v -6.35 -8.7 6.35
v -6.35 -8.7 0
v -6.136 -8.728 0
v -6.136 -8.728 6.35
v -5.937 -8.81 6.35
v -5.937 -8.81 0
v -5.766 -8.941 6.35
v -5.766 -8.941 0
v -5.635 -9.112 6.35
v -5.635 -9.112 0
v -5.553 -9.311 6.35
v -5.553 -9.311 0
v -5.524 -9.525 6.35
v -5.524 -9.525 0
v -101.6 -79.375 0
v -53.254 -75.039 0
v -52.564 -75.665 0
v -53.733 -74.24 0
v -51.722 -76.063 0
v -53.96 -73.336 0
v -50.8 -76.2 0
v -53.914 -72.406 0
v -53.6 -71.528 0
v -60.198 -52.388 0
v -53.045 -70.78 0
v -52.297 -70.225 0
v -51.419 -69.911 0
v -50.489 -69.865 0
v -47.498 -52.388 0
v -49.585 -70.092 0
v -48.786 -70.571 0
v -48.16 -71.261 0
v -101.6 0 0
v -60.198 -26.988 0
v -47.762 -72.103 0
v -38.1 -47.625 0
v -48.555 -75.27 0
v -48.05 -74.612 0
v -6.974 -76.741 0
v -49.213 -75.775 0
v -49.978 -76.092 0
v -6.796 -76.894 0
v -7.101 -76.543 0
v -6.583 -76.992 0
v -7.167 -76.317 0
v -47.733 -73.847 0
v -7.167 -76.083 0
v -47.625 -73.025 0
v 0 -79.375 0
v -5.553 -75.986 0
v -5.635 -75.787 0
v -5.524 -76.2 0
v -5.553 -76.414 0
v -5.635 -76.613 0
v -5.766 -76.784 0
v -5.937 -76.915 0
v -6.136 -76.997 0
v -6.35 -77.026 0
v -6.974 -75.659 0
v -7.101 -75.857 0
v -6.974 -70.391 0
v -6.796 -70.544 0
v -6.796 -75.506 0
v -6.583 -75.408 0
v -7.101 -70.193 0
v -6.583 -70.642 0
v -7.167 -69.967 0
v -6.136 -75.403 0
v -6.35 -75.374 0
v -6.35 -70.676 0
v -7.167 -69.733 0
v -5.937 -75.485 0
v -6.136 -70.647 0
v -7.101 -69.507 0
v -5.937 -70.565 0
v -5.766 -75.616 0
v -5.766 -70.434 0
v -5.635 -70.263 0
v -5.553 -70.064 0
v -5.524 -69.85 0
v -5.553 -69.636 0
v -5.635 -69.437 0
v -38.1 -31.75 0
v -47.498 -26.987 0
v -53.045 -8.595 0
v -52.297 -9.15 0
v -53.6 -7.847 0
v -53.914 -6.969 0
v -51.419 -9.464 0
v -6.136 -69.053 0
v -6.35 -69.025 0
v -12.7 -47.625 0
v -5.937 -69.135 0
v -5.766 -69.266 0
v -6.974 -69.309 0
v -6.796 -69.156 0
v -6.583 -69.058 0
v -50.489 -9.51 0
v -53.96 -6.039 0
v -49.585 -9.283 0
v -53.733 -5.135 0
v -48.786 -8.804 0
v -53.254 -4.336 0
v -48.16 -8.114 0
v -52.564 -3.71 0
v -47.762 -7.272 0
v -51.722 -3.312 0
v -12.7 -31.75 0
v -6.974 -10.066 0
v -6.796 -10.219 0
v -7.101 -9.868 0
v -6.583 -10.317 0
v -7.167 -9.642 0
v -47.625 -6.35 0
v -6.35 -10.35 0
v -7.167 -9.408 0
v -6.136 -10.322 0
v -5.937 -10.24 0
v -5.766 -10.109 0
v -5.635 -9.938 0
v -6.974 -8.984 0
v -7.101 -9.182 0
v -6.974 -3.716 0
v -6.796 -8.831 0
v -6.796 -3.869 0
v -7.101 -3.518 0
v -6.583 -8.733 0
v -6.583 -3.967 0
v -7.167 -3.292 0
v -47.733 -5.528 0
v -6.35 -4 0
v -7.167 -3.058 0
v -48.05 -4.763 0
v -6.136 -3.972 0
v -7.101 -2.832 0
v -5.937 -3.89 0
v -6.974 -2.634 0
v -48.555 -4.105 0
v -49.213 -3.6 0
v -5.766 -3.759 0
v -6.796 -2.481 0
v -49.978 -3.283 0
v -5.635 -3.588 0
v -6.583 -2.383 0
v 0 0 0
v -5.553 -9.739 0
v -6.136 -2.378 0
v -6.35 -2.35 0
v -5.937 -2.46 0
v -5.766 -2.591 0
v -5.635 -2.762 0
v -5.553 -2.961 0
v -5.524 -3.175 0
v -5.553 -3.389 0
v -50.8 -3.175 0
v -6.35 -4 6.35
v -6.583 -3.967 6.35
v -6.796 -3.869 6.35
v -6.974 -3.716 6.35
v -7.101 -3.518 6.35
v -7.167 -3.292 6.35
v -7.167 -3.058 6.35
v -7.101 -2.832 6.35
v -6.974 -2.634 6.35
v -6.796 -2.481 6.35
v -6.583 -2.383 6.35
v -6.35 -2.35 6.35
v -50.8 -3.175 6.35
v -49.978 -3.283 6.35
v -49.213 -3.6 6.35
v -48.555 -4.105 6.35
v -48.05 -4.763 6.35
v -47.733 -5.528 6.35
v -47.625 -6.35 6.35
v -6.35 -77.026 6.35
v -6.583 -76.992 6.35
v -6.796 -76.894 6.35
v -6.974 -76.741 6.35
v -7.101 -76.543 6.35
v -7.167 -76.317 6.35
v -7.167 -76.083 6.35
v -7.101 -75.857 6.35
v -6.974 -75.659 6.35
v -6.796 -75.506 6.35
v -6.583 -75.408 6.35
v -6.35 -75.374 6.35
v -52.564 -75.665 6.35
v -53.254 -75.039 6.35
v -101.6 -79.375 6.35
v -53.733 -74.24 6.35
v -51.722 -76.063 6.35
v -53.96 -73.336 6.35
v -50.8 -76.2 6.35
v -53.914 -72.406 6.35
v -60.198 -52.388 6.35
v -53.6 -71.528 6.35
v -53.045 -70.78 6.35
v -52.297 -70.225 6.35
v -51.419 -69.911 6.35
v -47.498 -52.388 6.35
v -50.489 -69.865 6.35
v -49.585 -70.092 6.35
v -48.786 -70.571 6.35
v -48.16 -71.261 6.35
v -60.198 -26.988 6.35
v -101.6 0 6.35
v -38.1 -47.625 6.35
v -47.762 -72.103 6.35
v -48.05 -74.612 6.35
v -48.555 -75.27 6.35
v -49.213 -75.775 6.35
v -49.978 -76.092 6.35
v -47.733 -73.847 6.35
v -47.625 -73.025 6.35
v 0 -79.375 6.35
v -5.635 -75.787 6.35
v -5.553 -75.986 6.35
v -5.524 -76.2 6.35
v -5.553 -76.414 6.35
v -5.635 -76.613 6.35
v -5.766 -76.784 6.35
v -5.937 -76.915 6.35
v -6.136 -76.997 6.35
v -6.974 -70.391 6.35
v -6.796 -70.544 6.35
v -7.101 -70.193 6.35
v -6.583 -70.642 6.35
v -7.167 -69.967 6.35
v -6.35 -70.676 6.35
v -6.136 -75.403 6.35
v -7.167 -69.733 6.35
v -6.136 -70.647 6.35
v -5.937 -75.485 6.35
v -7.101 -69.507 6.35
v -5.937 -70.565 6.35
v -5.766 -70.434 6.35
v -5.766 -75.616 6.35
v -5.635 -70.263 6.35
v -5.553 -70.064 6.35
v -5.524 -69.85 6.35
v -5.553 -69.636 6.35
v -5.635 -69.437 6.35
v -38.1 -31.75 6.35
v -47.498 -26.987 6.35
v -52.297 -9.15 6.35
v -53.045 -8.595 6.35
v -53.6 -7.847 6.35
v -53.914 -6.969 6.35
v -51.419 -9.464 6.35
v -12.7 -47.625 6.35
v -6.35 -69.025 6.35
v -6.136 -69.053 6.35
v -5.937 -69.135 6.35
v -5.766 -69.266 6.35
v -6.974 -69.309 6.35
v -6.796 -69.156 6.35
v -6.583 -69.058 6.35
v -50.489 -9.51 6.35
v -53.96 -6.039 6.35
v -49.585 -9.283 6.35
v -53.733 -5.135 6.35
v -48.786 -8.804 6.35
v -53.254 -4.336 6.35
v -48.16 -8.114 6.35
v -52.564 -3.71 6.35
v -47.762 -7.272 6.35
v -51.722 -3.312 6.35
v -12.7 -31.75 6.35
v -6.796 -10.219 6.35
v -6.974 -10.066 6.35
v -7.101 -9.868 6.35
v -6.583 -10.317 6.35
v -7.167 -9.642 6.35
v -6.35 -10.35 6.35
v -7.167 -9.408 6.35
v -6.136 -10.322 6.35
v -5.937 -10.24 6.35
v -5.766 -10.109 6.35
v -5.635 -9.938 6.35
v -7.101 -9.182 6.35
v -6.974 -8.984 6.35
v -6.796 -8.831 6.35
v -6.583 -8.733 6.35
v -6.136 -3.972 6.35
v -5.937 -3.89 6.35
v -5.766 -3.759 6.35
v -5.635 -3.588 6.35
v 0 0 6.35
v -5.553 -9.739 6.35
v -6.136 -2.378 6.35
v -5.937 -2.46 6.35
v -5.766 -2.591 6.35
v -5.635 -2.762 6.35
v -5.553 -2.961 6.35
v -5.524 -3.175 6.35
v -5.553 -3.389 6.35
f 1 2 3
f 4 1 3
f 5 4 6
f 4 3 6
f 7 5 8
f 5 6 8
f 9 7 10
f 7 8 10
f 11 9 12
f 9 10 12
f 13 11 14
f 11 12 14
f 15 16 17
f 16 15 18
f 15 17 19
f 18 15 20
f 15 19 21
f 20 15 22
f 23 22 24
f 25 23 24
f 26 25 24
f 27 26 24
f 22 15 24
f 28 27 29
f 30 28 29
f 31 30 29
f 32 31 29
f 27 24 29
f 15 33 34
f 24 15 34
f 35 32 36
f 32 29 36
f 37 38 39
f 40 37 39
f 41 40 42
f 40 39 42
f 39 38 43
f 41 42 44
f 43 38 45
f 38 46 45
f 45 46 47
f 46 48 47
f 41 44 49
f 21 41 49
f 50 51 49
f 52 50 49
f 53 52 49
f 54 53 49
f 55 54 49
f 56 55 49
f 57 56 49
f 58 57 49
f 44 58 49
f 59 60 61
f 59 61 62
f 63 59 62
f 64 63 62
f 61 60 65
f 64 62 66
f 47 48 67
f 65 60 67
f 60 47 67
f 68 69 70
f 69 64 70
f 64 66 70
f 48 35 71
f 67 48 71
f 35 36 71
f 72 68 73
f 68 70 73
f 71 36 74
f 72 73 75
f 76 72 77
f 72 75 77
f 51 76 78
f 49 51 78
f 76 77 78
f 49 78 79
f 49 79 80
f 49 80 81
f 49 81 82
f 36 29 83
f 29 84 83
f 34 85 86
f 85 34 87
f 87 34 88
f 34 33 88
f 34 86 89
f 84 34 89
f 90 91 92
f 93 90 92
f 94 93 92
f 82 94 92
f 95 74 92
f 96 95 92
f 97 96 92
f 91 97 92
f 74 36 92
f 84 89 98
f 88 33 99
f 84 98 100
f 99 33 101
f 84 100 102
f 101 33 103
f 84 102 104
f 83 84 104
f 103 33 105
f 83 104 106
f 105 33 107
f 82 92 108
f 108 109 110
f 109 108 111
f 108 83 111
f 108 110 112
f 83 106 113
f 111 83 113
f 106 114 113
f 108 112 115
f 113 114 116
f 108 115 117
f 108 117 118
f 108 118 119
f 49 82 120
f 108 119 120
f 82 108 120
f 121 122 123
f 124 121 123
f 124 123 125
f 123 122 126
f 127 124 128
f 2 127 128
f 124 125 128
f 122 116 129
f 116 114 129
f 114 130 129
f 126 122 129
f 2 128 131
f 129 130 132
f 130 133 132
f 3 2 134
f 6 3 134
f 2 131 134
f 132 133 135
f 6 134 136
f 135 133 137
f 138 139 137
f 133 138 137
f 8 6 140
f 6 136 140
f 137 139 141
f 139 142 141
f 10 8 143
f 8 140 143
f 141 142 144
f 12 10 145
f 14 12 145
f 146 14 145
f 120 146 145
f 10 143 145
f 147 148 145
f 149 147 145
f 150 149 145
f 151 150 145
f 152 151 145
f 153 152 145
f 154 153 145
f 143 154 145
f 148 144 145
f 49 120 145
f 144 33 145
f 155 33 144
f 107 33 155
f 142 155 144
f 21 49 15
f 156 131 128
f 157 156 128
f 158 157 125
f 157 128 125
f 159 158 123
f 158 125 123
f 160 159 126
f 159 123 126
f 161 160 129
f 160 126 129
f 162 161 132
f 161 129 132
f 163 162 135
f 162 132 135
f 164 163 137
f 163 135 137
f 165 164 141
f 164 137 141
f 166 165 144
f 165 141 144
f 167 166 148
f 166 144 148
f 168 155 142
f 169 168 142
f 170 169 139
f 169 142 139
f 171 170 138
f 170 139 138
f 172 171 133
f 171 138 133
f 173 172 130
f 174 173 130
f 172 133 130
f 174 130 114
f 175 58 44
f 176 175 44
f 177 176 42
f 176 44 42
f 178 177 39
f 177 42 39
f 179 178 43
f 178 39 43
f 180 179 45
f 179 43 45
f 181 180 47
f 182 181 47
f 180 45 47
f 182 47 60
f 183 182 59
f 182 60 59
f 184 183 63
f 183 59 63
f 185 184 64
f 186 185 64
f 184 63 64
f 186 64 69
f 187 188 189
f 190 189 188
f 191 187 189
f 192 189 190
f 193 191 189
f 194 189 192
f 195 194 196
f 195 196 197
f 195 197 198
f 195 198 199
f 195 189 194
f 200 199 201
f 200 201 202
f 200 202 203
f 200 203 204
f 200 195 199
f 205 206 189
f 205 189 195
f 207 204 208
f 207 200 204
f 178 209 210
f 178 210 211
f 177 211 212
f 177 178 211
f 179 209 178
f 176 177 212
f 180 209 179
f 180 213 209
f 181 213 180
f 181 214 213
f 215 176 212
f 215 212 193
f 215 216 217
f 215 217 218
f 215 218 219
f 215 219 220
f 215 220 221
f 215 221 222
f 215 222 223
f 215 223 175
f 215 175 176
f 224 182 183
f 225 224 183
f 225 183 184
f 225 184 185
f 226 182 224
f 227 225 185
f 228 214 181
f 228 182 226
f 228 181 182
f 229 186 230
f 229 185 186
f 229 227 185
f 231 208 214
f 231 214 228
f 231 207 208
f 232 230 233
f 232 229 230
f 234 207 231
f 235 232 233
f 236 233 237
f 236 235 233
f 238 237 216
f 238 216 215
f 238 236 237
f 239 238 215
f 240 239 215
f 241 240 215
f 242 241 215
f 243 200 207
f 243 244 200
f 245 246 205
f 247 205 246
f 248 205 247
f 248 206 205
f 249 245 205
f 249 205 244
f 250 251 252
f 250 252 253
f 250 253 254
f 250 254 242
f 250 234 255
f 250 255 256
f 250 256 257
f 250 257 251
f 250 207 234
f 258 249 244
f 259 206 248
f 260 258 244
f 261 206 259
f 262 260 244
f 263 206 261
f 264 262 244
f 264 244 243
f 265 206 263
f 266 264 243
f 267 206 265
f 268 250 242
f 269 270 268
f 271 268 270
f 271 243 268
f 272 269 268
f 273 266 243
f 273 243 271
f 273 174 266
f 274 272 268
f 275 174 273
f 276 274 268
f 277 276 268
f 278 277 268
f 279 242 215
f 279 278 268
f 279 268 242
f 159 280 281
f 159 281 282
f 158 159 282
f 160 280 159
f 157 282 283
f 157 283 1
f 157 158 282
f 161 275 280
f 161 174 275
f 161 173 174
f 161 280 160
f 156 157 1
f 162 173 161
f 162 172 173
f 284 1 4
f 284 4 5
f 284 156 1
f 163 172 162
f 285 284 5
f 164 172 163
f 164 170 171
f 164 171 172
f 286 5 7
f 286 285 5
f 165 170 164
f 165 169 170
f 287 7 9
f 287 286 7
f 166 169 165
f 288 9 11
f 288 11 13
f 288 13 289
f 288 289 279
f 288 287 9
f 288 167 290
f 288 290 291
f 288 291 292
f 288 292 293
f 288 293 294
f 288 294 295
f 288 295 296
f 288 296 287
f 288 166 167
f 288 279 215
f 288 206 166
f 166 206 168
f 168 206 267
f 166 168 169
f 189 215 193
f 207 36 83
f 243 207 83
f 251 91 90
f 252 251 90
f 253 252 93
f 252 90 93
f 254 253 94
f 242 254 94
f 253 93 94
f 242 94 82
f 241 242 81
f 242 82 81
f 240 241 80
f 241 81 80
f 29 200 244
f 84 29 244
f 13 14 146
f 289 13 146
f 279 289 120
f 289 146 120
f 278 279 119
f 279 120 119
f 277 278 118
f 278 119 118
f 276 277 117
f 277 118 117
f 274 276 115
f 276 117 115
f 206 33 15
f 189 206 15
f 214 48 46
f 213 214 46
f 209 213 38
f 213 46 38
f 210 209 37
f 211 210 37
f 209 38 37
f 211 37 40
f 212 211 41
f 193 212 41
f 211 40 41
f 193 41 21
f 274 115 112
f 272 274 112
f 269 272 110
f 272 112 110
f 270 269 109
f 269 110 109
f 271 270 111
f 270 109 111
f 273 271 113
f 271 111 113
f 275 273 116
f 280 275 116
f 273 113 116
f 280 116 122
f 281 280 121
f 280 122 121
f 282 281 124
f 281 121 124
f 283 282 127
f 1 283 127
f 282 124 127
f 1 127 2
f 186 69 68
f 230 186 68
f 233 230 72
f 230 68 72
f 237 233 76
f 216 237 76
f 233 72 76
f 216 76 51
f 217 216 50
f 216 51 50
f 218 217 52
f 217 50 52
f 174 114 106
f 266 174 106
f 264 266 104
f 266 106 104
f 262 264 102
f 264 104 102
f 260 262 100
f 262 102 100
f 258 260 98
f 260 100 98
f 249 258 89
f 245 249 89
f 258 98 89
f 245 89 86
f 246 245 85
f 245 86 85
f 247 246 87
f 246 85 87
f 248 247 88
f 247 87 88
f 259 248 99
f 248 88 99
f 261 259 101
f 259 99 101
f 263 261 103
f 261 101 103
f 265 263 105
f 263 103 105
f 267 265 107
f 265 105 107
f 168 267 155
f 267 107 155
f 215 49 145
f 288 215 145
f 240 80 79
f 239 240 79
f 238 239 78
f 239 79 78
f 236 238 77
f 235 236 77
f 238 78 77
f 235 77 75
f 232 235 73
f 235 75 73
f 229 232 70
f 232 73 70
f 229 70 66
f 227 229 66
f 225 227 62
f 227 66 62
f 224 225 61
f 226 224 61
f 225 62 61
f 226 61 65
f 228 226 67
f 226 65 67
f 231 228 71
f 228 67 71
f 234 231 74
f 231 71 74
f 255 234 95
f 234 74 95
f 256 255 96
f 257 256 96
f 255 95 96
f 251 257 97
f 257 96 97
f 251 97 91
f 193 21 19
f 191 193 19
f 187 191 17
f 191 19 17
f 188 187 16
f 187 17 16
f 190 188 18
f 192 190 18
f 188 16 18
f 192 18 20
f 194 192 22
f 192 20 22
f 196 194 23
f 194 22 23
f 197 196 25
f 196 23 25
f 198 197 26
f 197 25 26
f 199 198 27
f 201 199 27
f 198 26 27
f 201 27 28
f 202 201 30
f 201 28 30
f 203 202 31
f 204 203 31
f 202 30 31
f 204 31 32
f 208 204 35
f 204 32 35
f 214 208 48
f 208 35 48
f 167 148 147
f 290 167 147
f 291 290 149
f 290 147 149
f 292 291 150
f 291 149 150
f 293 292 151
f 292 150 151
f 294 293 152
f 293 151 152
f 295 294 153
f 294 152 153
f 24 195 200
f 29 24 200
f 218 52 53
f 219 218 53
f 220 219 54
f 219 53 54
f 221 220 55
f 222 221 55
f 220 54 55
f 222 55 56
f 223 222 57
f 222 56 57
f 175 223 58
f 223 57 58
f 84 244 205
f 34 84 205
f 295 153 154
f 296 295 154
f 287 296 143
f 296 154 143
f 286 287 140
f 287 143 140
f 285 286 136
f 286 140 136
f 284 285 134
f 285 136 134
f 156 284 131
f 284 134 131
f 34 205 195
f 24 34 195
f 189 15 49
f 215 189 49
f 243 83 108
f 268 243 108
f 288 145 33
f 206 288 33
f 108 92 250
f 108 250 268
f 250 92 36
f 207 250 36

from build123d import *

# Parameters (mm, degrees)
F0_W     = 12.7
F0_H     = 15.875
F1_DEPTH = 6.35
F2_R     = 0.8255
F2_W     = 6.35
F2_H     = 12.7
F3_DEPTH = 25.4


with BuildPart() as f1:
    # F0 (on Top) → F1 (new body)
    with BuildSketch(Plane.XY):
        with BuildLine():
            Line((0, -12.7), (0, 0))
            Line((0, 0), (-6.35, 0))
            Line((-6.35, 0), (-6.35, -2.3495))
            ThreePointArc((-6.35, -2.3495), (-5.766283, -2.591283), (-5.5245, -3.175))
            ThreePointArc((-5.5245, -3.175), (-5.766283, -3.758717), (-6.35, -4.0005))
            Line((-6.35, -4.0005), (-6.35, -8.6995))
            ThreePointArc((-6.35, -8.6995), (-5.766283, -8.941283), (-5.5245, -9.525))
            ThreePointArc((-5.5245, -9.525), (-5.766283, -10.108717), (-6.35, -10.3505))
            Line((-6.35, -10.3505), (-6.35, -12.7))
            Line((-6.35, -12.7), (0, -12.7))
        make_face()
        with BuildLine():
            Line((-6.35, -2.3495), (-6.35, 0))
            Line((-6.35, 0), (-12.7, 0))
            Line((-12.7, 0), (-12.7, -12.7))
            Line((-12.7, -12.7), (-6.35, -12.7))
            Line((-6.35, -12.7), (-6.35, -10.3505))
            ThreePointArc((-6.35, -10.3505), (-7.1755, -9.525), (-6.35, -8.6995))
            Line((-6.35, -8.6995), (-6.35, -4.0005))
            ThreePointArc((-6.35, -4.0005), (-7.1755, -3.175), (-6.35, -2.3495))
        make_face()
        with BuildLine():
            ThreePointArc((-47.625, -6.35), (-48.554936, -4.104936), (-50.8, -3.175))
            ThreePointArc((-50.8, -3.175), (-53.045064, -8.595064), (-47.625, -6.35))
        make_face()
        with BuildLine():
            ThreePointArc((-47.625, -73.025), (-53.045064, -70.779936), (-50.8, -76.2))
            ThreePointArc((-50.8, -76.2), (-48.554936, -75.270064), (-47.625, -73.025))
        make_face()
        Polygon((0, -31.75), (0, -12.7), (-6.35, -12.7), (-12.7, -12.7), (-12.7, 0), (-50.8, 0), (-101.6, 0), (-101.6, -79.375), (-50.8, -79.375), (-12.7, -79.375), (-12.7, -66.675), (-6.35, -66.675), (0, -66.675), (0, -47.625), (-12.7, -47.625), (-38.1, -47.625), (-38.1, -31.75), (-12.7, -31.75), align=None)
        with BuildLine():
            ThreePointArc((-47.625, -73.025), (-48.554936, -75.270064), (-50.8, -76.2))
            ThreePointArc((-50.8, -76.2), (-53.045064, -70.779936), (-47.625, -73.025))
        make_face(mode=Mode.SUBTRACT)
        with BuildLine():
            ThreePointArc((-47.625, -6.35), (-53.045064, -8.595064), (-50.8, -3.175))
            ThreePointArc((-50.8, -3.175), (-48.554936, -4.104936), (-47.625, -6.35))
        make_face(mode=Mode.SUBTRACT)
        with Locations((-6.35, -39.6875)):
            Rectangle(F0_W, F0_H)
        with BuildLine():
            Line((0, -79.375), (0, -66.675))
            Line((0, -66.675), (-6.35, -66.675))
            Line((-6.35, -66.675), (-6.35, -69.0245))
            ThreePointArc((-6.35, -69.0245), (-5.766283, -69.266283), (-5.5245, -69.85))
            ThreePointArc((-5.5245, -69.85), (-5.766283, -70.433717), (-6.35, -70.6755))
            Line((-6.35, -70.6755), (-6.35, -75.3745))
            ThreePointArc((-6.35, -75.3745), (-5.766283, -75.616283), (-5.5245, -76.2))
            ThreePointArc((-5.5245, -76.2), (-5.766283, -76.783717), (-6.35, -77.0255))
            Line((-6.35, -77.0255), (-6.35, -79.375))
            Line((-6.35, -79.375), (0, -79.375))
        make_face()
        with BuildLine():
            Line((-6.35, -69.0245), (-6.35, -66.675))
            Line((-6.35, -66.675), (-12.7, -66.675))
            Line((-12.7, -66.675), (-12.7, -79.375))
            Line((-12.7, -79.375), (-6.35, -79.375))
            Line((-6.35, -79.375), (-6.35, -77.0255))
            ThreePointArc((-6.35, -77.0255), (-7.1755, -76.2), (-6.35, -75.3745))
            Line((-6.35, -75.3745), (-6.35, -70.6755))
            ThreePointArc((-6.35, -70.6755), (-7.1755, -69.85), (-6.35, -69.0245))
        make_face()
    extrude(amount=F1_DEPTH)

    # F2 (on face) → F3 (cut)
    with BuildSketch(Plane.XY.offset(6.35)):
        with Locations((-6.35, -3.175)):
            Circle(F2_R)
        with Locations((-6.35, -9.525)):
            Circle(F2_R)
        with Locations((-50.673, -33.3375)):
            Rectangle(F2_W, F2_H)
        Polygon((-53.848, -39.6875), (-53.848, -26.9875), (-60.198, -26.9875), (-60.198, -52.3875), (-47.498, -52.3875), (-47.498, -39.6875), align=None)
    extrude(amount=-F3_DEPTH, mode=Mode.SUBTRACT)


solid = f1.part
